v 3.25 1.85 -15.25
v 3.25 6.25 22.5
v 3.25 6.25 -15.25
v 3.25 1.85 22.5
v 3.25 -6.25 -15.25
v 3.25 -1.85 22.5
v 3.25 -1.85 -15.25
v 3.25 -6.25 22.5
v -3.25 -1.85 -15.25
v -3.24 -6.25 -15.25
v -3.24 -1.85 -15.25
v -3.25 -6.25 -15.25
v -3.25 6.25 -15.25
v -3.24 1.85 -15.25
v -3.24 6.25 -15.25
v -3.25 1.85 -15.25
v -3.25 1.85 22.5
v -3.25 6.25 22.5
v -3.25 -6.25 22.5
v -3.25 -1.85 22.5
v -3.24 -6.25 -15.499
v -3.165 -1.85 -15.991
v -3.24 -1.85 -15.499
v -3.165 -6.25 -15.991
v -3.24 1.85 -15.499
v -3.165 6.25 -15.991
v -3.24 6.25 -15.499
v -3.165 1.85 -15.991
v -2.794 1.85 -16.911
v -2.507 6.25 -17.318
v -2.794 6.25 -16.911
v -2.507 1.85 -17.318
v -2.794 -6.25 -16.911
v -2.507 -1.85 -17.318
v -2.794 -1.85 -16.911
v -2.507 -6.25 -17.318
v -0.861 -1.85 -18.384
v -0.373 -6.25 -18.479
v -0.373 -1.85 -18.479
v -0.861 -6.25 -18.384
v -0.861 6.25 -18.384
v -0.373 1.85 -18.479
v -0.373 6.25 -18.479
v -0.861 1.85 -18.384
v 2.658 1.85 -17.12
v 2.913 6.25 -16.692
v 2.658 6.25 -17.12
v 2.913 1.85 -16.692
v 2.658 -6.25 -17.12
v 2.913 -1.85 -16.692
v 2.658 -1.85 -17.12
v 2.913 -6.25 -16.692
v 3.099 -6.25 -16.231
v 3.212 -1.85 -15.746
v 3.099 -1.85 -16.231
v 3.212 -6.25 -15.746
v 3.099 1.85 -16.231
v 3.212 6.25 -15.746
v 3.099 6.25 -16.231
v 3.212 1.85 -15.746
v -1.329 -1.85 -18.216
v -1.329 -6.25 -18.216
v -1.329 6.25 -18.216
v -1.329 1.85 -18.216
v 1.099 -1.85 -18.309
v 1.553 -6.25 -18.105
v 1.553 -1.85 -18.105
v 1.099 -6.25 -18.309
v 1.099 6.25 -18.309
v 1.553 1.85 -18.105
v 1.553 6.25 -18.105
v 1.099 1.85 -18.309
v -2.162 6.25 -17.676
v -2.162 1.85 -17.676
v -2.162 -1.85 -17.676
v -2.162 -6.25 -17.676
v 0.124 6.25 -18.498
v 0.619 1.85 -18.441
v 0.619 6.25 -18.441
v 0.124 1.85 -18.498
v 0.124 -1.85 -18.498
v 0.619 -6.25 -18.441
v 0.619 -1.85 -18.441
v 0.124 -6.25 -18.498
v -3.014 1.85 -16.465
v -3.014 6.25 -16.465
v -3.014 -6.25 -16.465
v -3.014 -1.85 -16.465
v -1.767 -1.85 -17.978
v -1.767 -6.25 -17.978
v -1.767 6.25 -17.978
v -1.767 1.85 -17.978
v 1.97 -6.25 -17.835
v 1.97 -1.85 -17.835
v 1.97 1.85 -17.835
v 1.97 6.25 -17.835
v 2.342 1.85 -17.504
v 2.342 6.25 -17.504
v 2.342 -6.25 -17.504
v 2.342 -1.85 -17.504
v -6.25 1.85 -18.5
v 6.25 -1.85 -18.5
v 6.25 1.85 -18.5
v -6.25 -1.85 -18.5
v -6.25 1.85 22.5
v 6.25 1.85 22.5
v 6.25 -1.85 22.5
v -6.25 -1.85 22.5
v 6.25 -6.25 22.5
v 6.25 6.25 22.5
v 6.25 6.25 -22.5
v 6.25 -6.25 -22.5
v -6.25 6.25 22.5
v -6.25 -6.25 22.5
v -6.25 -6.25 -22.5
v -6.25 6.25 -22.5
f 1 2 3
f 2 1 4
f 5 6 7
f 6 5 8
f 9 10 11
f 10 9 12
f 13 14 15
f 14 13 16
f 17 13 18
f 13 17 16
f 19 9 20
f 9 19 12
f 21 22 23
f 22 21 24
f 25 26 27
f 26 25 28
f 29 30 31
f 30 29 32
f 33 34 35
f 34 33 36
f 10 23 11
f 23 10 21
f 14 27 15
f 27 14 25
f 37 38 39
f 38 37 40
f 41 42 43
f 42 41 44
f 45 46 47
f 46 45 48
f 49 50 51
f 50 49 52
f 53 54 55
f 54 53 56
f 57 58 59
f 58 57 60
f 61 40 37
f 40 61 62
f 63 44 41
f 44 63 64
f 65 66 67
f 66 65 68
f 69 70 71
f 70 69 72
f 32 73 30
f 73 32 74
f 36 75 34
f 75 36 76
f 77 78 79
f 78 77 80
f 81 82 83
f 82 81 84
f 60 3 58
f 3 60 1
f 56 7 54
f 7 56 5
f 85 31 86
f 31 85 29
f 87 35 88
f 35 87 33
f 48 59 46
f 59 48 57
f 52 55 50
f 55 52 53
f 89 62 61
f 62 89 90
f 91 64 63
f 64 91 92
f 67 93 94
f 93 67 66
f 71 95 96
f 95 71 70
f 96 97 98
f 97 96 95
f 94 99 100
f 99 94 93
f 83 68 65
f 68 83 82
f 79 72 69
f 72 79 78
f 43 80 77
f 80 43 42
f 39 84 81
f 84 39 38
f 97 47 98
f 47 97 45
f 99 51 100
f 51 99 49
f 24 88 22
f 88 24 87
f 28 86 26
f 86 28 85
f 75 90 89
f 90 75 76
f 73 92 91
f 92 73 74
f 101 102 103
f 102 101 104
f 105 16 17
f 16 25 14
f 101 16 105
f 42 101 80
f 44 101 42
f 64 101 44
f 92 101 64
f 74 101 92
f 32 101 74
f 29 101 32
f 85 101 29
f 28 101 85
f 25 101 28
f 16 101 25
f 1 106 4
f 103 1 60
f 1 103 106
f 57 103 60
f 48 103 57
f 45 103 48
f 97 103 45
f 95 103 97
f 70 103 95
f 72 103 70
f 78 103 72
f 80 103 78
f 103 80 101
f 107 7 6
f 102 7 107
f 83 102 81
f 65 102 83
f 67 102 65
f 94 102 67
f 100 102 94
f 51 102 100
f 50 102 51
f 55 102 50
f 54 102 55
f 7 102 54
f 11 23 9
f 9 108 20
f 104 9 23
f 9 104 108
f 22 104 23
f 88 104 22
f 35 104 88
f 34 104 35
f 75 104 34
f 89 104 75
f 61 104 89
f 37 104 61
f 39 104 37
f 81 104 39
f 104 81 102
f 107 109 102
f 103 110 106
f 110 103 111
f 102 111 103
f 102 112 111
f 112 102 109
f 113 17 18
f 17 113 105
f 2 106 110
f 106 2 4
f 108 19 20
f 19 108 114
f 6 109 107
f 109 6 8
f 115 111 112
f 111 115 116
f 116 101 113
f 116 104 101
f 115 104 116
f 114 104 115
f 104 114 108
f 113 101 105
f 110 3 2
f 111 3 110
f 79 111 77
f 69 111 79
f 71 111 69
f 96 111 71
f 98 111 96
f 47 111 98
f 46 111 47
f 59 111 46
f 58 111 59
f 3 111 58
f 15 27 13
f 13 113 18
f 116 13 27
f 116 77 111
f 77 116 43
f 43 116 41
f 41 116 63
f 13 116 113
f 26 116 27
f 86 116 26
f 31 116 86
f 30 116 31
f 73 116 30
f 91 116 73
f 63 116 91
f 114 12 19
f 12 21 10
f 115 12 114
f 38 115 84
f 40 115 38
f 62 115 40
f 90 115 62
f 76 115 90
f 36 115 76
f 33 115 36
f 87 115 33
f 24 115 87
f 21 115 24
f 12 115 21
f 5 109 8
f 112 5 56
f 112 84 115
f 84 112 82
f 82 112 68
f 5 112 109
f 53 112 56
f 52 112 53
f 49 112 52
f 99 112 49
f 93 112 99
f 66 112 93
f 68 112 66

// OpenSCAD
// [FL_INDEX: keywords="openscad, 3d_parametric, Customizable_Cuvette_Adaptor, csg_solid" | COT="Parametric OpenSCAD design from 3DCodeverse"]
// Title: Customizable Cuvette Adaptor

//design and code by emanresu (http://www.thingiverse.com/Emanresu)


//CUSTOMIZER VARIABLES

//cuvette adaptor width (mm)
adaptor_x=12.5;
//cuvette adaptor length (in beampath dimention) (mm)
adaptor_y=12.5;
//cuvette adaptor height (mm)
adaptor_z=45;
//thickness of material at the base of the adaptor (mm)
bottom_thick=4;
//width of adaptor window (mm)
adaptor_window_width=6.5;
//outer thickness of cuvette in beampath dimention (assumes cuvette is full width of adaptor)
cuvette_y=3.7;

/* [Hidden] */

//Set openSCAD resolution
$fa=1;
$fs=0.5;


  /////////////
 // Modules //
/////////////

module holder_body() {
	// body...
	cube(size=[adaptor_x, adaptor_y, adaptor_z], center=true);
}

module adaptor_window_width() {
	// body...
	translate([0, 0, adaptor_window_width/2]) {
		cube(size=[adaptor_window_width, adaptor_y+1, adaptor_z], center=true);
	}
	translate([0, 0, -(adaptor_z-adaptor_window_width)/2]) {
		rotate([90, 00, 00]) {
			cylinder(r=adaptor_window_width/2, h=adaptor_y+1, center=true);
		}
	}	
}

module cuvette_cutout() {
	// body...
	cube(size=[adaptor_x+1, cuvette_y, adaptor_z], center=true);
}


  //////////////////
 // Control Code //
//////////////////

difference() {
	holder_body();
	translate([0, 0, bottom_thick]) {
		adaptor_window_width();
		cuvette_cutout();
	}
}
